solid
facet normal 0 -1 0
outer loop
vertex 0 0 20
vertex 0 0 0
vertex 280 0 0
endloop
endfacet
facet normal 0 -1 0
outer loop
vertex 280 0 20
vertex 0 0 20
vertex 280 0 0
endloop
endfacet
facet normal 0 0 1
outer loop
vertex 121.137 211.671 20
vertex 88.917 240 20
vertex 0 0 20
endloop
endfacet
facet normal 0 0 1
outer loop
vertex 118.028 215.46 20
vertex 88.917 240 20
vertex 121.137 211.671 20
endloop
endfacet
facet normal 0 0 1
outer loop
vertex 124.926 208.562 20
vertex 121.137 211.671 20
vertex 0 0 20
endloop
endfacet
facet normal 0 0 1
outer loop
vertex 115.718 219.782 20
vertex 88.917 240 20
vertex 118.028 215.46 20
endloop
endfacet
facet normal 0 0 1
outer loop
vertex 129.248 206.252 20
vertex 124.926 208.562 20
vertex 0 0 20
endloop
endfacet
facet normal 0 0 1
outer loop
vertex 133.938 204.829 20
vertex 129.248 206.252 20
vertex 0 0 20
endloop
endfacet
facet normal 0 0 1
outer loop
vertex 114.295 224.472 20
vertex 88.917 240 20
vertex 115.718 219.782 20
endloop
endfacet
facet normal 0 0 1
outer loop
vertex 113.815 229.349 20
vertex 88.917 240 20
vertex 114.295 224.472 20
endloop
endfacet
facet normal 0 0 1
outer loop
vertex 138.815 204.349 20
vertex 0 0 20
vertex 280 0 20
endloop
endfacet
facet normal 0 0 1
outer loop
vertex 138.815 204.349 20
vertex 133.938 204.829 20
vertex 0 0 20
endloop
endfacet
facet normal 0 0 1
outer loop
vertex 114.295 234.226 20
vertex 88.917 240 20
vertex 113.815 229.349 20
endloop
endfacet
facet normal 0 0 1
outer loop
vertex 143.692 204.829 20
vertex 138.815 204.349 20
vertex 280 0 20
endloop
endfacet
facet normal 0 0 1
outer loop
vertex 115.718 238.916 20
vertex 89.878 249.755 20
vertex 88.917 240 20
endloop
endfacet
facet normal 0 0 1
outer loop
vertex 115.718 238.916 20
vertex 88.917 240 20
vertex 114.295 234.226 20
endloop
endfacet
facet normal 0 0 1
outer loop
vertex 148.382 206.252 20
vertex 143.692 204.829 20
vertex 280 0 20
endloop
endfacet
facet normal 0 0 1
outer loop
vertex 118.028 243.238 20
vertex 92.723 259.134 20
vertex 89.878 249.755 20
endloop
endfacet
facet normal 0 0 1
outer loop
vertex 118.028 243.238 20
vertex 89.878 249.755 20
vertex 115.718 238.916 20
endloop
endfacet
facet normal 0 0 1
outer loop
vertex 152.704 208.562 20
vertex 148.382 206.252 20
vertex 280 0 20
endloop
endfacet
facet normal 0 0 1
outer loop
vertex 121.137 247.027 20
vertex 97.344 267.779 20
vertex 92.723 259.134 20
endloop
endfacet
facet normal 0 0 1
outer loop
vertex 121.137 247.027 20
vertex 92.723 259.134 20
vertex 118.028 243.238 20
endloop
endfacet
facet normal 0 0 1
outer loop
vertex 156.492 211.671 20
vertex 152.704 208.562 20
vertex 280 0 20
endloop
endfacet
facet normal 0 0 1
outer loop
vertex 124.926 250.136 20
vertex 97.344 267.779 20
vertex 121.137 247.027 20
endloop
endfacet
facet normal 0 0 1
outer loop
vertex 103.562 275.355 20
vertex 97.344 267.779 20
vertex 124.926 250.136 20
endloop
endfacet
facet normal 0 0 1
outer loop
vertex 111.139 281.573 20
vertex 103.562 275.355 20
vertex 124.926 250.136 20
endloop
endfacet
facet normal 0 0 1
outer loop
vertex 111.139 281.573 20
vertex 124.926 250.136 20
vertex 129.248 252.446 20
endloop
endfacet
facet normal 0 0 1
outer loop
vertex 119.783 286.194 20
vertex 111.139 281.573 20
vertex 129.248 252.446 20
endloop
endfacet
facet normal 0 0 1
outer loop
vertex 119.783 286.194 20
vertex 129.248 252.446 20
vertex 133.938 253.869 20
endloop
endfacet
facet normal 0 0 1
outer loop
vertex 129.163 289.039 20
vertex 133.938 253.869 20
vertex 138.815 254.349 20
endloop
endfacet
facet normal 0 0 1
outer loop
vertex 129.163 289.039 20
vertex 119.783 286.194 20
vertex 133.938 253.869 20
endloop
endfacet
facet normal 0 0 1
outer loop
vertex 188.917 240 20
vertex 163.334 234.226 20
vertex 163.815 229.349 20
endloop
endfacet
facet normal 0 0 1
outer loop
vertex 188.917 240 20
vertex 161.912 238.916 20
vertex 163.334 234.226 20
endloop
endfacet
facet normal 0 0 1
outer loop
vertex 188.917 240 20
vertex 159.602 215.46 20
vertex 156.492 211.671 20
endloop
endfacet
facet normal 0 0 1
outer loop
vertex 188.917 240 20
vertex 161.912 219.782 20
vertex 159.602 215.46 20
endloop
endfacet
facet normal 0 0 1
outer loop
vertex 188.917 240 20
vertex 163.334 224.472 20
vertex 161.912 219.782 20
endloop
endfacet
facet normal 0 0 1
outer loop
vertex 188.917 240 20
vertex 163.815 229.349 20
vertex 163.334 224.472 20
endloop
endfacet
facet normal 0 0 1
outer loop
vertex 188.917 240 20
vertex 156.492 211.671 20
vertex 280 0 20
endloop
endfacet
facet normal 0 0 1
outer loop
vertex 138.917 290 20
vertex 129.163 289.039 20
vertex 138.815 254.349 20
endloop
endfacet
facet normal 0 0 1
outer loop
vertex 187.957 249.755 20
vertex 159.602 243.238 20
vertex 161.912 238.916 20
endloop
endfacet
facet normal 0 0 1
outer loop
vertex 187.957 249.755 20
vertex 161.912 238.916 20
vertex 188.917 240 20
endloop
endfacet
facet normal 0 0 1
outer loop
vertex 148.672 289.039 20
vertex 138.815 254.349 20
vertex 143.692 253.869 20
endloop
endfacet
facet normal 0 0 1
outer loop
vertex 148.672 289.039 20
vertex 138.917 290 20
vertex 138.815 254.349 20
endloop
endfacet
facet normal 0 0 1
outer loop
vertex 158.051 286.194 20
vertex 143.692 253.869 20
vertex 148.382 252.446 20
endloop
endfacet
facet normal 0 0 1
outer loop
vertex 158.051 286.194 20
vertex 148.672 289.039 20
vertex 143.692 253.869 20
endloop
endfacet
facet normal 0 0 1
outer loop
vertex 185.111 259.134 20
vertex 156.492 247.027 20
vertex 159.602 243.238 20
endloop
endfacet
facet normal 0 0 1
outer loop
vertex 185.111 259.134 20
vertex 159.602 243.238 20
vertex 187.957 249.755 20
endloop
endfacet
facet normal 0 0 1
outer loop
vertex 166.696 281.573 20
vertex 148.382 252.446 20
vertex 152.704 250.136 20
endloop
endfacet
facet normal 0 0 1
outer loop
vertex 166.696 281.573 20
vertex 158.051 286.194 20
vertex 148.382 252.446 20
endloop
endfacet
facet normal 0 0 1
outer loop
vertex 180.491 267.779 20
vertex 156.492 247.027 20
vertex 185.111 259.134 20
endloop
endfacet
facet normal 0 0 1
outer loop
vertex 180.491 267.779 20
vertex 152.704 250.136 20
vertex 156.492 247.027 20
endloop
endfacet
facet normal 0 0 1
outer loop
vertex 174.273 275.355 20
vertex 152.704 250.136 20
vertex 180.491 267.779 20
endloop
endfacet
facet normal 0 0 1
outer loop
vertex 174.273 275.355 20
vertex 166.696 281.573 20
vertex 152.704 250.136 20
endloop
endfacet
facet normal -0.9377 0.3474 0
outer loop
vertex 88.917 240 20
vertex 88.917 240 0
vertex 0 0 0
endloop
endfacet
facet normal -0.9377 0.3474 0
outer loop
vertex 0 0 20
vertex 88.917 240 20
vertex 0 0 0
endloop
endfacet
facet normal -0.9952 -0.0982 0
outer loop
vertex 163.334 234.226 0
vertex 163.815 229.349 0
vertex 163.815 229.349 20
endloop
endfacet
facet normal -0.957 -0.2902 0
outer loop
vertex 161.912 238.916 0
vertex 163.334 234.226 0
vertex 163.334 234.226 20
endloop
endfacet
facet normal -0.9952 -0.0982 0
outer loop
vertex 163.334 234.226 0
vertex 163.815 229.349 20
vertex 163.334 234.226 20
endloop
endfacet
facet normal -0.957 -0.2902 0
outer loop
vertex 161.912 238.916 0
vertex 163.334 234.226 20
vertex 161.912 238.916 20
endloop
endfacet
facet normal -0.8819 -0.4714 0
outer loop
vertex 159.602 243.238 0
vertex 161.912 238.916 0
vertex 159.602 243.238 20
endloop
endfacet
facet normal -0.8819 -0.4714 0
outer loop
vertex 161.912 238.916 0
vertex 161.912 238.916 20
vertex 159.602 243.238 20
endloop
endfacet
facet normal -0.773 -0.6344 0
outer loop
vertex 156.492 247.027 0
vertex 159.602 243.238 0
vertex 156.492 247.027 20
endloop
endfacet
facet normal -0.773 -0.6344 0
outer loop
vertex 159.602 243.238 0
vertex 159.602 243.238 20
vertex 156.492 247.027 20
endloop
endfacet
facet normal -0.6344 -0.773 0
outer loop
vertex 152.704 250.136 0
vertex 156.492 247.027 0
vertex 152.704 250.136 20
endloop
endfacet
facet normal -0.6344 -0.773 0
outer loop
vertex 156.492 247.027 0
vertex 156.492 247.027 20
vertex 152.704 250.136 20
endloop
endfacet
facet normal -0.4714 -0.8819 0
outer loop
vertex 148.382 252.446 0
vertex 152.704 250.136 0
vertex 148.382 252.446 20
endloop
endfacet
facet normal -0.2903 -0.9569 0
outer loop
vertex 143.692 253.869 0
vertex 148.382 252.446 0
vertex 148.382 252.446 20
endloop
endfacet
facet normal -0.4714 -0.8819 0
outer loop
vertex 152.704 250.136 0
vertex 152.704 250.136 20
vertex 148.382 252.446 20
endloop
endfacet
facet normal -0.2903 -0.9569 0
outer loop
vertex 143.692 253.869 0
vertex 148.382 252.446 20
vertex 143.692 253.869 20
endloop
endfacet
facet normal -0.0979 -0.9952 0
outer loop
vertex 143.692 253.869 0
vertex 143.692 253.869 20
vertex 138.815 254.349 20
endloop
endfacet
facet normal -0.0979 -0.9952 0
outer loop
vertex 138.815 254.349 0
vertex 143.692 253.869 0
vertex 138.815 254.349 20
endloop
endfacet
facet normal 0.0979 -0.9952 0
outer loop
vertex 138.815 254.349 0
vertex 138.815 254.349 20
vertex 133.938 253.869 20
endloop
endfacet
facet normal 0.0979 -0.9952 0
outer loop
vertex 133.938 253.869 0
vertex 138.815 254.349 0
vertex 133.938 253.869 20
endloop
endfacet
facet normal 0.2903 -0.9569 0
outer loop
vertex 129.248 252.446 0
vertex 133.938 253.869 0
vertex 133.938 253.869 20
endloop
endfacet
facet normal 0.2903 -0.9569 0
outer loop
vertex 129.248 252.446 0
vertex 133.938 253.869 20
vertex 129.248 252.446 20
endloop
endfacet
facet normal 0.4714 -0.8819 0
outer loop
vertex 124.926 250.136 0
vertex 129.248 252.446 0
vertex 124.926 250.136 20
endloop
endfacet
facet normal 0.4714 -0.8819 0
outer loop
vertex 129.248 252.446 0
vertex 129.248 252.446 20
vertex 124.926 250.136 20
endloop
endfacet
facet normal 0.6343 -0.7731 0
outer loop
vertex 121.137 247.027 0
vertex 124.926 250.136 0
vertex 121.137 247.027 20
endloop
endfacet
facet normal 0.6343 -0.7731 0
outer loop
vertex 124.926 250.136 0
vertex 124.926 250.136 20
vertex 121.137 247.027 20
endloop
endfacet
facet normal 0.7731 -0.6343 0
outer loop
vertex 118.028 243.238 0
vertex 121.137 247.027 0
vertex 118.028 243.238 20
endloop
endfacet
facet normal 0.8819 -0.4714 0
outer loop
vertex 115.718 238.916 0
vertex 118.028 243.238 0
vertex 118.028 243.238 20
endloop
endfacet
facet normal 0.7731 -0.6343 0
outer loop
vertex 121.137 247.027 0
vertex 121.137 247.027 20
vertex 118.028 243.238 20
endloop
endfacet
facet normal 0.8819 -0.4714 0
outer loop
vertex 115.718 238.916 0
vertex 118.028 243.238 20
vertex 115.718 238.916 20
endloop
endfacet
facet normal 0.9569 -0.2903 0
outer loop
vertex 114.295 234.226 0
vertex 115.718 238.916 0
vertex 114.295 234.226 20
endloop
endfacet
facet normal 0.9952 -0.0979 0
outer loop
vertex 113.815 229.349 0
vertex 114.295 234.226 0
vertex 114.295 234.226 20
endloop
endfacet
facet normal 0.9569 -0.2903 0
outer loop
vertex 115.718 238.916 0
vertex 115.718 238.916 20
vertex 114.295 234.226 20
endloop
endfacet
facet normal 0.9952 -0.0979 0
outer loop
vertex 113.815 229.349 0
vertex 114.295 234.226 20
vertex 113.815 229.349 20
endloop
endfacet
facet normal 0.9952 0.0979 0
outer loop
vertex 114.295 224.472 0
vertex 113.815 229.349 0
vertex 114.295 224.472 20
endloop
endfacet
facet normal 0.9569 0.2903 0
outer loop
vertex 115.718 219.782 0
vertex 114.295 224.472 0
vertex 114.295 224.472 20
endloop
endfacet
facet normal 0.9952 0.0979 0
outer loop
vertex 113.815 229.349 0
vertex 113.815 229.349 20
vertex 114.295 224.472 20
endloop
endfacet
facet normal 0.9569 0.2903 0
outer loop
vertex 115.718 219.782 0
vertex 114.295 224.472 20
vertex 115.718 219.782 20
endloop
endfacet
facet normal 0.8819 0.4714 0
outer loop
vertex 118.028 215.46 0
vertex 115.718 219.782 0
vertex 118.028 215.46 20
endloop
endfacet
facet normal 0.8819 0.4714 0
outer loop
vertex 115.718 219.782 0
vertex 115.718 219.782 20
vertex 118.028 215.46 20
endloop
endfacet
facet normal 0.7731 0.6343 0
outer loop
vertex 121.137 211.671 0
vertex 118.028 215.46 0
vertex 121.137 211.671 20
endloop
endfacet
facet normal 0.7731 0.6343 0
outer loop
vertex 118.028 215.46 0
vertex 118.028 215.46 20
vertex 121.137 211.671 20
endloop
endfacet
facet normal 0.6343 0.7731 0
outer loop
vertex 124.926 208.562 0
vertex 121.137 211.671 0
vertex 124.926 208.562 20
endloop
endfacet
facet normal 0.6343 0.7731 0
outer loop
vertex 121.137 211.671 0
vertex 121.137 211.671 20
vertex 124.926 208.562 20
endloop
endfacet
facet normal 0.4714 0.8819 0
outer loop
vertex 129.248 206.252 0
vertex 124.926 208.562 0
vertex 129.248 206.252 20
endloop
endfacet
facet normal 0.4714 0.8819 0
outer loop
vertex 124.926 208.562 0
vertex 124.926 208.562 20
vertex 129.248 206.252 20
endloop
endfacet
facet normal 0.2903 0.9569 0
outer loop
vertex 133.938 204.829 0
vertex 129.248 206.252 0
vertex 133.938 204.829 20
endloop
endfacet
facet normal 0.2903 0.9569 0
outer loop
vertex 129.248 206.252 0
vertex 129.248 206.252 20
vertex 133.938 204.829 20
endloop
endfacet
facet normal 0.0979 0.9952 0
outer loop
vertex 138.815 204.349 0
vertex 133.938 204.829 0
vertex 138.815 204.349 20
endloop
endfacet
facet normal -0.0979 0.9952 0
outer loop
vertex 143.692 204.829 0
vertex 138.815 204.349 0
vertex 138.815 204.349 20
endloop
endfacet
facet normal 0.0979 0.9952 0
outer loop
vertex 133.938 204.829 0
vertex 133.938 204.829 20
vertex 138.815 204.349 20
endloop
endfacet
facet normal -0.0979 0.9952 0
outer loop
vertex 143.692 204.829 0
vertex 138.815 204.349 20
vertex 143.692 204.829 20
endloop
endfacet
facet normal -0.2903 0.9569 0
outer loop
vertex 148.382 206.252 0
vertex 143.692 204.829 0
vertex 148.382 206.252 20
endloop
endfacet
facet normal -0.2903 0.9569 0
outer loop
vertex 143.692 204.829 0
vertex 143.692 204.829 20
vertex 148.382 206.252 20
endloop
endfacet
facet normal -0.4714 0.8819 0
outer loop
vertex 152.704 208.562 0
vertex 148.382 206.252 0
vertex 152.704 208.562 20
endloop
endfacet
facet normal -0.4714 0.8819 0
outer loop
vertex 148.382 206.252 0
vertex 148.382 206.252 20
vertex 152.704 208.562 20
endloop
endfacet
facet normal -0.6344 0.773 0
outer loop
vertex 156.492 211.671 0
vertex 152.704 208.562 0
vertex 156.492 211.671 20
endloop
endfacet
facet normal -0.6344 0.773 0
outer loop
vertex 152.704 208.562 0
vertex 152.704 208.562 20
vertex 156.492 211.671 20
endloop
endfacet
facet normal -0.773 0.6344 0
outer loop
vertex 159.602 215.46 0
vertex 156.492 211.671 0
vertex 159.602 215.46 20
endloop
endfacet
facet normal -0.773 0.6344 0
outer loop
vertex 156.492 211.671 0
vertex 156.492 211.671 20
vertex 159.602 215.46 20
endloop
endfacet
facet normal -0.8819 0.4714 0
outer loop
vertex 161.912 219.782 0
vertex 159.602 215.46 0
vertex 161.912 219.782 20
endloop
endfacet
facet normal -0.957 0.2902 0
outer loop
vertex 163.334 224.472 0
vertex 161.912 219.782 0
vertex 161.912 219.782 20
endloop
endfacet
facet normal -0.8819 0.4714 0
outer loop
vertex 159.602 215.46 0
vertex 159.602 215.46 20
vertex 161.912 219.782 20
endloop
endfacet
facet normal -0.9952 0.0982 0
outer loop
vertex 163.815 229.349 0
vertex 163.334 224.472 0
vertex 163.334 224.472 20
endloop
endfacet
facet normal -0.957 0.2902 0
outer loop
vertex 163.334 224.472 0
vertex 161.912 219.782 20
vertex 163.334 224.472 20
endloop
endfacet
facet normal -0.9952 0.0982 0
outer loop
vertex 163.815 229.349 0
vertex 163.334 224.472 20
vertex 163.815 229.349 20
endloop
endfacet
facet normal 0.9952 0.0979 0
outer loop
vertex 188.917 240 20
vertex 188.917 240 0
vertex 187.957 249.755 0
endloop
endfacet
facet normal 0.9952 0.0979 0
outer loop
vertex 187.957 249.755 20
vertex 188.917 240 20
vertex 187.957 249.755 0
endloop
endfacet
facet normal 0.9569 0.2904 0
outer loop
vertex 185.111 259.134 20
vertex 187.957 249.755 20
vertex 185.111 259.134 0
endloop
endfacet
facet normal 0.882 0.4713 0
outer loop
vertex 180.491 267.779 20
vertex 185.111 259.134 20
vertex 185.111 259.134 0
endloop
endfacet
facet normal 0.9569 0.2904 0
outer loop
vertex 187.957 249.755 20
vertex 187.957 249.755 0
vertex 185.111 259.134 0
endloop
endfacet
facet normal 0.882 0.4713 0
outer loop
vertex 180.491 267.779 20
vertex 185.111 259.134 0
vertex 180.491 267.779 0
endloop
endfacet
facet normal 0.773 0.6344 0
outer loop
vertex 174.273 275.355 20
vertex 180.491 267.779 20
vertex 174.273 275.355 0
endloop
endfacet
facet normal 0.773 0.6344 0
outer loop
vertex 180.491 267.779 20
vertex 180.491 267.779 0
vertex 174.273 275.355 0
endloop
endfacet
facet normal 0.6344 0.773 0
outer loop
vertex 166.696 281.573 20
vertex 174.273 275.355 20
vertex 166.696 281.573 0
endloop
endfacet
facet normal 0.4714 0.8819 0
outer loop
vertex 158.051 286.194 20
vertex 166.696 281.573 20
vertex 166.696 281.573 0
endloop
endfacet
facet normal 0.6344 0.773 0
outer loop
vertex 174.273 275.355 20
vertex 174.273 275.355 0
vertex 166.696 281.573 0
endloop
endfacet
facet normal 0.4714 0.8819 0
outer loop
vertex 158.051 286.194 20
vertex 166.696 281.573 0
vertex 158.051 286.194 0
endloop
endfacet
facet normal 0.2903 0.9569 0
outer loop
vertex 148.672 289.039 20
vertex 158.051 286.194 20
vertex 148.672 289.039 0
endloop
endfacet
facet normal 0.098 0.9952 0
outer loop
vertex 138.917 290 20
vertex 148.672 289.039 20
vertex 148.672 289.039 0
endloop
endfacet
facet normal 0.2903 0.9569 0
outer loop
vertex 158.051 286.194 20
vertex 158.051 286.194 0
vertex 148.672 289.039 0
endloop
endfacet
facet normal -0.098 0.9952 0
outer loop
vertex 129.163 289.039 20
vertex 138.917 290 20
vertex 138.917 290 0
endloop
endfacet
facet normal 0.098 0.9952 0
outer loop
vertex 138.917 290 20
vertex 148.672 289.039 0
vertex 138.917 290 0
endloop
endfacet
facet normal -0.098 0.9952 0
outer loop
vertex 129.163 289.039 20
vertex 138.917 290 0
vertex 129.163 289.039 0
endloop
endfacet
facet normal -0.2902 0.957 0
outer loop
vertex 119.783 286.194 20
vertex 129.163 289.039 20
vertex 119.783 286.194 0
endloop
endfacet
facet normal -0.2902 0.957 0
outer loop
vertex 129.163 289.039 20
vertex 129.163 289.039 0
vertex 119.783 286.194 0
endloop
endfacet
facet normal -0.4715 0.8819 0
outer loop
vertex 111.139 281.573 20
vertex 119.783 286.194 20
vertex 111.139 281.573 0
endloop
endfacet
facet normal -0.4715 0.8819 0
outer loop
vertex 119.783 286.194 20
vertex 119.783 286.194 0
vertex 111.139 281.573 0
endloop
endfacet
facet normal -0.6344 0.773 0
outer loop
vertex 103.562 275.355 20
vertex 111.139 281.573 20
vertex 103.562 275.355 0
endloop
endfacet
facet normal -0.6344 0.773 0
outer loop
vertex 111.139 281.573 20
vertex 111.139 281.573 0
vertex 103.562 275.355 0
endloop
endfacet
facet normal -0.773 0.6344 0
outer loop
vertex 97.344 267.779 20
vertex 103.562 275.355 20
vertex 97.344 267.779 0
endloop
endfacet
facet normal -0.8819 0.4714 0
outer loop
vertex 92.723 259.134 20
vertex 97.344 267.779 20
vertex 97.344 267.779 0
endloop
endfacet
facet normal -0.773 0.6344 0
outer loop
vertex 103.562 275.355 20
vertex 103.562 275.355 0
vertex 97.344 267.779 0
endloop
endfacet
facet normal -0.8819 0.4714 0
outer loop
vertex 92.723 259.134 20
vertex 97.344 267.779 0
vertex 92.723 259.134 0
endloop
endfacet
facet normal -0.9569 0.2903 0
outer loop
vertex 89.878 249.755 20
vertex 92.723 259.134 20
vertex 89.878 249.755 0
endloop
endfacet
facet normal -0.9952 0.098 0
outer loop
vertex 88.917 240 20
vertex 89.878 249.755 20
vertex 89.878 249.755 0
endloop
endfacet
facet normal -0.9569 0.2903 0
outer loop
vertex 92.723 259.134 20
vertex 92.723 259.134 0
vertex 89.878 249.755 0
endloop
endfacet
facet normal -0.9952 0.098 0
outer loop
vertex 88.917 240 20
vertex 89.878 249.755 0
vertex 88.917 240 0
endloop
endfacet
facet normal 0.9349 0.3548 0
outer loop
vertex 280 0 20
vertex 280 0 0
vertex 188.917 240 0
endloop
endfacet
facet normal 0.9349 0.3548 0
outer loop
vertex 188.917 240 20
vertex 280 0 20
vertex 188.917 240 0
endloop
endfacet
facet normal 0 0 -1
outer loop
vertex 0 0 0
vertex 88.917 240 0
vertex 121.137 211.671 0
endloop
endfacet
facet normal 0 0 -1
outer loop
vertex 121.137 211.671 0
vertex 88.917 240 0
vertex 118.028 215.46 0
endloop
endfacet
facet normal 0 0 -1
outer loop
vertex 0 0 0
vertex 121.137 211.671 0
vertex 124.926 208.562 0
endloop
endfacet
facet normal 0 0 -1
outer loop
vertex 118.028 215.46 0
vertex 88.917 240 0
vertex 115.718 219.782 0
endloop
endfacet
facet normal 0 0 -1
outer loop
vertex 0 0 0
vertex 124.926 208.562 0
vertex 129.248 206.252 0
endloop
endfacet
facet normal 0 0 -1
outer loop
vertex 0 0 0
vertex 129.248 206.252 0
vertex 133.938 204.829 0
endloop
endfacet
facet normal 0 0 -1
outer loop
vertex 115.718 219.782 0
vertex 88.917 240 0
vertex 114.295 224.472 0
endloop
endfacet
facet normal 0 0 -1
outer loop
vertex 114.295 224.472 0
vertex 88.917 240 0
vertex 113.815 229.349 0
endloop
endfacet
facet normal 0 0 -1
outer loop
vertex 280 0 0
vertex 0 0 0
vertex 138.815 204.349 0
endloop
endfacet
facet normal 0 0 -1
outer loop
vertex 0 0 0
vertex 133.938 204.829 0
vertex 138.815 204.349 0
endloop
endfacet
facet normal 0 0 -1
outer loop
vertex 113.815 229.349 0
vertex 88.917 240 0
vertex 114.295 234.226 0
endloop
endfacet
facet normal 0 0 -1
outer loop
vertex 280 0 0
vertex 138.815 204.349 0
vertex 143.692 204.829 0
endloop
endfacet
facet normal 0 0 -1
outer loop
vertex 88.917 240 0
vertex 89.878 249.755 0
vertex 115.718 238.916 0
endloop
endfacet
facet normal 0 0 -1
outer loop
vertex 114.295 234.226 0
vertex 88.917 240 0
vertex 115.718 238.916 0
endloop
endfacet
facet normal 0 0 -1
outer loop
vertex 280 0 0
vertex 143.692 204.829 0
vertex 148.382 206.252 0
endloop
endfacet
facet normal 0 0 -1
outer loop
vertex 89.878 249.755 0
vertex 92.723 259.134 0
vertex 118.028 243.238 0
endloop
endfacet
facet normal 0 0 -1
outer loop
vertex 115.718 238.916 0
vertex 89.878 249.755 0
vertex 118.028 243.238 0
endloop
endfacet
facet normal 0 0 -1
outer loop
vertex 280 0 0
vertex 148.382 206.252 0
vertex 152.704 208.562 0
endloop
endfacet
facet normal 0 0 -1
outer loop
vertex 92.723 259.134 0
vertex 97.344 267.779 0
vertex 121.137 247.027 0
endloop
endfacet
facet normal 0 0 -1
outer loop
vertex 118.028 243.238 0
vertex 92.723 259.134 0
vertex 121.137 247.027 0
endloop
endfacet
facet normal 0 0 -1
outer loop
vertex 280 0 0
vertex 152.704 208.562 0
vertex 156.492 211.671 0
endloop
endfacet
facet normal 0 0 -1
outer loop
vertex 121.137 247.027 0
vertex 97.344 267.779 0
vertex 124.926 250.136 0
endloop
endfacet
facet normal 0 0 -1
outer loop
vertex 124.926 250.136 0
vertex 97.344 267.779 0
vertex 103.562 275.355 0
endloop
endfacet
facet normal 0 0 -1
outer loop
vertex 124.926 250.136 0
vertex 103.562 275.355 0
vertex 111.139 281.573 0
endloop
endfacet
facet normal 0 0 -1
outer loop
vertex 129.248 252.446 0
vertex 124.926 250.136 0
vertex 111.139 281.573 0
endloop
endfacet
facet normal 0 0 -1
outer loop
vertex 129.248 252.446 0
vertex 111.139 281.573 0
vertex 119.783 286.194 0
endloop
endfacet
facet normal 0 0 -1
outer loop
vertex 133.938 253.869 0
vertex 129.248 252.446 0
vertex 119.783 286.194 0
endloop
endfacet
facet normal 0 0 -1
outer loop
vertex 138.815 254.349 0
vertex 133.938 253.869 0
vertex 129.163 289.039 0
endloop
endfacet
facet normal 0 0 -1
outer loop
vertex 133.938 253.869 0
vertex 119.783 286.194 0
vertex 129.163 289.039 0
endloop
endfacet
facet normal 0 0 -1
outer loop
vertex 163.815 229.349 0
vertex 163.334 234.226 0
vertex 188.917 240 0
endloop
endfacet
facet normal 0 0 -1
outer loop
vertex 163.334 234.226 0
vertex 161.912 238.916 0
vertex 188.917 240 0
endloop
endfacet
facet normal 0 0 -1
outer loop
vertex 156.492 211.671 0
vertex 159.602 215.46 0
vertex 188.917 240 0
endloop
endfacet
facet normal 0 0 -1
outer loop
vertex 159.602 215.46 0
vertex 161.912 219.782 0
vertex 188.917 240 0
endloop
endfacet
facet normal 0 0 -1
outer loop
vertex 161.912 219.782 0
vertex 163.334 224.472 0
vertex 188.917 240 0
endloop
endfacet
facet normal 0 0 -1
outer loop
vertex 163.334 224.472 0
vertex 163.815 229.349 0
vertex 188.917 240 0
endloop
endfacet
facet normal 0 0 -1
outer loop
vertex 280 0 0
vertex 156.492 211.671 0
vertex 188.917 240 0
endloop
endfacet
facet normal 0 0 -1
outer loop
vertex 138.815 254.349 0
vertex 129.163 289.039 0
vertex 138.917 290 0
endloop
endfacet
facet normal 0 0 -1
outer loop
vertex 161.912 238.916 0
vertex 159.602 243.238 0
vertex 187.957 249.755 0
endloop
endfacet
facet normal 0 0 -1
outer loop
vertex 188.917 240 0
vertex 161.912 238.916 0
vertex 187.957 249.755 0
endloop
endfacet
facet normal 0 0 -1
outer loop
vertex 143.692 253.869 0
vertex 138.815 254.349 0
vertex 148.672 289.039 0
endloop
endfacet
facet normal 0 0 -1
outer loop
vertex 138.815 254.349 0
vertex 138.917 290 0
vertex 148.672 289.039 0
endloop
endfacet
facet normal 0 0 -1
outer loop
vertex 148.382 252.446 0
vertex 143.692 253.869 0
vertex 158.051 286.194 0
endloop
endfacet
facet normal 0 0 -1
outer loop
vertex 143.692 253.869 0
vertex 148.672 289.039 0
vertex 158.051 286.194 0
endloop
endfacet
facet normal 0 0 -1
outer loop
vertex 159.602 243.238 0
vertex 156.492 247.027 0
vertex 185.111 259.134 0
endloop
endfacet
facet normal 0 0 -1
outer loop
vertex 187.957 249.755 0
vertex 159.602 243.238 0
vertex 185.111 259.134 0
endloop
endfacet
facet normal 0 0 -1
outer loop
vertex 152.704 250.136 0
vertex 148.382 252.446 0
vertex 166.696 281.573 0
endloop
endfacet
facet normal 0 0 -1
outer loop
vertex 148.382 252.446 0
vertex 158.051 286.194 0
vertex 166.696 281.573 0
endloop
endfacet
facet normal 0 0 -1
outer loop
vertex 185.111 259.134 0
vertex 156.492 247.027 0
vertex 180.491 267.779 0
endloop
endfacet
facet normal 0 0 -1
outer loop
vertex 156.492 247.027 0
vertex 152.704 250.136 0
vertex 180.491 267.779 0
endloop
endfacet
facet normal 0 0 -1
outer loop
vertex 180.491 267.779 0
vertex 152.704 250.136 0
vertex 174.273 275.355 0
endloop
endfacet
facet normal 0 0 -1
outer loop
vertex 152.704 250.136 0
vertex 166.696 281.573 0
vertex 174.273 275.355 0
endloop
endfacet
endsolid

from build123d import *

# Parameters (mm, degrees)
SKETCH1_R           = 50
BOSS_EXTRUDE2_DEPTH = 20
SKETCH2_R           = 25
CUT_EXTRUDE1_DEPTH  = 20


with BuildPart() as part:
    # Sketch1 → Boss-Extrude2 (new body)
    with BuildSketch(Plane.XY):
        with BuildLine():
            Line((88.917270049, 240), (0, 0))
            Line((0, 0), (280, 0))
            Line((280, 0), (188.917270049, 240))
            ThreePointArc((188.917270049, 240), (138.917270049, 190), (88.917270049, 240))
        make_face()
        with Locations((138.917270049, 240)):
            Circle(SKETCH1_R)
    extrude(amount=BOSS_EXTRUDE2_DEPTH)

    # Sketch2 → Cut-Extrude1 (cut)
    with BuildSketch(Plane.XY.offset(20)):
        with Locations((138.81476789, 229.349018501)):
            Circle(SKETCH2_R)
    extrude(amount=-CUT_EXTRUDE1_DEPTH, mode=Mode.SUBTRACT)


solid = part.part
